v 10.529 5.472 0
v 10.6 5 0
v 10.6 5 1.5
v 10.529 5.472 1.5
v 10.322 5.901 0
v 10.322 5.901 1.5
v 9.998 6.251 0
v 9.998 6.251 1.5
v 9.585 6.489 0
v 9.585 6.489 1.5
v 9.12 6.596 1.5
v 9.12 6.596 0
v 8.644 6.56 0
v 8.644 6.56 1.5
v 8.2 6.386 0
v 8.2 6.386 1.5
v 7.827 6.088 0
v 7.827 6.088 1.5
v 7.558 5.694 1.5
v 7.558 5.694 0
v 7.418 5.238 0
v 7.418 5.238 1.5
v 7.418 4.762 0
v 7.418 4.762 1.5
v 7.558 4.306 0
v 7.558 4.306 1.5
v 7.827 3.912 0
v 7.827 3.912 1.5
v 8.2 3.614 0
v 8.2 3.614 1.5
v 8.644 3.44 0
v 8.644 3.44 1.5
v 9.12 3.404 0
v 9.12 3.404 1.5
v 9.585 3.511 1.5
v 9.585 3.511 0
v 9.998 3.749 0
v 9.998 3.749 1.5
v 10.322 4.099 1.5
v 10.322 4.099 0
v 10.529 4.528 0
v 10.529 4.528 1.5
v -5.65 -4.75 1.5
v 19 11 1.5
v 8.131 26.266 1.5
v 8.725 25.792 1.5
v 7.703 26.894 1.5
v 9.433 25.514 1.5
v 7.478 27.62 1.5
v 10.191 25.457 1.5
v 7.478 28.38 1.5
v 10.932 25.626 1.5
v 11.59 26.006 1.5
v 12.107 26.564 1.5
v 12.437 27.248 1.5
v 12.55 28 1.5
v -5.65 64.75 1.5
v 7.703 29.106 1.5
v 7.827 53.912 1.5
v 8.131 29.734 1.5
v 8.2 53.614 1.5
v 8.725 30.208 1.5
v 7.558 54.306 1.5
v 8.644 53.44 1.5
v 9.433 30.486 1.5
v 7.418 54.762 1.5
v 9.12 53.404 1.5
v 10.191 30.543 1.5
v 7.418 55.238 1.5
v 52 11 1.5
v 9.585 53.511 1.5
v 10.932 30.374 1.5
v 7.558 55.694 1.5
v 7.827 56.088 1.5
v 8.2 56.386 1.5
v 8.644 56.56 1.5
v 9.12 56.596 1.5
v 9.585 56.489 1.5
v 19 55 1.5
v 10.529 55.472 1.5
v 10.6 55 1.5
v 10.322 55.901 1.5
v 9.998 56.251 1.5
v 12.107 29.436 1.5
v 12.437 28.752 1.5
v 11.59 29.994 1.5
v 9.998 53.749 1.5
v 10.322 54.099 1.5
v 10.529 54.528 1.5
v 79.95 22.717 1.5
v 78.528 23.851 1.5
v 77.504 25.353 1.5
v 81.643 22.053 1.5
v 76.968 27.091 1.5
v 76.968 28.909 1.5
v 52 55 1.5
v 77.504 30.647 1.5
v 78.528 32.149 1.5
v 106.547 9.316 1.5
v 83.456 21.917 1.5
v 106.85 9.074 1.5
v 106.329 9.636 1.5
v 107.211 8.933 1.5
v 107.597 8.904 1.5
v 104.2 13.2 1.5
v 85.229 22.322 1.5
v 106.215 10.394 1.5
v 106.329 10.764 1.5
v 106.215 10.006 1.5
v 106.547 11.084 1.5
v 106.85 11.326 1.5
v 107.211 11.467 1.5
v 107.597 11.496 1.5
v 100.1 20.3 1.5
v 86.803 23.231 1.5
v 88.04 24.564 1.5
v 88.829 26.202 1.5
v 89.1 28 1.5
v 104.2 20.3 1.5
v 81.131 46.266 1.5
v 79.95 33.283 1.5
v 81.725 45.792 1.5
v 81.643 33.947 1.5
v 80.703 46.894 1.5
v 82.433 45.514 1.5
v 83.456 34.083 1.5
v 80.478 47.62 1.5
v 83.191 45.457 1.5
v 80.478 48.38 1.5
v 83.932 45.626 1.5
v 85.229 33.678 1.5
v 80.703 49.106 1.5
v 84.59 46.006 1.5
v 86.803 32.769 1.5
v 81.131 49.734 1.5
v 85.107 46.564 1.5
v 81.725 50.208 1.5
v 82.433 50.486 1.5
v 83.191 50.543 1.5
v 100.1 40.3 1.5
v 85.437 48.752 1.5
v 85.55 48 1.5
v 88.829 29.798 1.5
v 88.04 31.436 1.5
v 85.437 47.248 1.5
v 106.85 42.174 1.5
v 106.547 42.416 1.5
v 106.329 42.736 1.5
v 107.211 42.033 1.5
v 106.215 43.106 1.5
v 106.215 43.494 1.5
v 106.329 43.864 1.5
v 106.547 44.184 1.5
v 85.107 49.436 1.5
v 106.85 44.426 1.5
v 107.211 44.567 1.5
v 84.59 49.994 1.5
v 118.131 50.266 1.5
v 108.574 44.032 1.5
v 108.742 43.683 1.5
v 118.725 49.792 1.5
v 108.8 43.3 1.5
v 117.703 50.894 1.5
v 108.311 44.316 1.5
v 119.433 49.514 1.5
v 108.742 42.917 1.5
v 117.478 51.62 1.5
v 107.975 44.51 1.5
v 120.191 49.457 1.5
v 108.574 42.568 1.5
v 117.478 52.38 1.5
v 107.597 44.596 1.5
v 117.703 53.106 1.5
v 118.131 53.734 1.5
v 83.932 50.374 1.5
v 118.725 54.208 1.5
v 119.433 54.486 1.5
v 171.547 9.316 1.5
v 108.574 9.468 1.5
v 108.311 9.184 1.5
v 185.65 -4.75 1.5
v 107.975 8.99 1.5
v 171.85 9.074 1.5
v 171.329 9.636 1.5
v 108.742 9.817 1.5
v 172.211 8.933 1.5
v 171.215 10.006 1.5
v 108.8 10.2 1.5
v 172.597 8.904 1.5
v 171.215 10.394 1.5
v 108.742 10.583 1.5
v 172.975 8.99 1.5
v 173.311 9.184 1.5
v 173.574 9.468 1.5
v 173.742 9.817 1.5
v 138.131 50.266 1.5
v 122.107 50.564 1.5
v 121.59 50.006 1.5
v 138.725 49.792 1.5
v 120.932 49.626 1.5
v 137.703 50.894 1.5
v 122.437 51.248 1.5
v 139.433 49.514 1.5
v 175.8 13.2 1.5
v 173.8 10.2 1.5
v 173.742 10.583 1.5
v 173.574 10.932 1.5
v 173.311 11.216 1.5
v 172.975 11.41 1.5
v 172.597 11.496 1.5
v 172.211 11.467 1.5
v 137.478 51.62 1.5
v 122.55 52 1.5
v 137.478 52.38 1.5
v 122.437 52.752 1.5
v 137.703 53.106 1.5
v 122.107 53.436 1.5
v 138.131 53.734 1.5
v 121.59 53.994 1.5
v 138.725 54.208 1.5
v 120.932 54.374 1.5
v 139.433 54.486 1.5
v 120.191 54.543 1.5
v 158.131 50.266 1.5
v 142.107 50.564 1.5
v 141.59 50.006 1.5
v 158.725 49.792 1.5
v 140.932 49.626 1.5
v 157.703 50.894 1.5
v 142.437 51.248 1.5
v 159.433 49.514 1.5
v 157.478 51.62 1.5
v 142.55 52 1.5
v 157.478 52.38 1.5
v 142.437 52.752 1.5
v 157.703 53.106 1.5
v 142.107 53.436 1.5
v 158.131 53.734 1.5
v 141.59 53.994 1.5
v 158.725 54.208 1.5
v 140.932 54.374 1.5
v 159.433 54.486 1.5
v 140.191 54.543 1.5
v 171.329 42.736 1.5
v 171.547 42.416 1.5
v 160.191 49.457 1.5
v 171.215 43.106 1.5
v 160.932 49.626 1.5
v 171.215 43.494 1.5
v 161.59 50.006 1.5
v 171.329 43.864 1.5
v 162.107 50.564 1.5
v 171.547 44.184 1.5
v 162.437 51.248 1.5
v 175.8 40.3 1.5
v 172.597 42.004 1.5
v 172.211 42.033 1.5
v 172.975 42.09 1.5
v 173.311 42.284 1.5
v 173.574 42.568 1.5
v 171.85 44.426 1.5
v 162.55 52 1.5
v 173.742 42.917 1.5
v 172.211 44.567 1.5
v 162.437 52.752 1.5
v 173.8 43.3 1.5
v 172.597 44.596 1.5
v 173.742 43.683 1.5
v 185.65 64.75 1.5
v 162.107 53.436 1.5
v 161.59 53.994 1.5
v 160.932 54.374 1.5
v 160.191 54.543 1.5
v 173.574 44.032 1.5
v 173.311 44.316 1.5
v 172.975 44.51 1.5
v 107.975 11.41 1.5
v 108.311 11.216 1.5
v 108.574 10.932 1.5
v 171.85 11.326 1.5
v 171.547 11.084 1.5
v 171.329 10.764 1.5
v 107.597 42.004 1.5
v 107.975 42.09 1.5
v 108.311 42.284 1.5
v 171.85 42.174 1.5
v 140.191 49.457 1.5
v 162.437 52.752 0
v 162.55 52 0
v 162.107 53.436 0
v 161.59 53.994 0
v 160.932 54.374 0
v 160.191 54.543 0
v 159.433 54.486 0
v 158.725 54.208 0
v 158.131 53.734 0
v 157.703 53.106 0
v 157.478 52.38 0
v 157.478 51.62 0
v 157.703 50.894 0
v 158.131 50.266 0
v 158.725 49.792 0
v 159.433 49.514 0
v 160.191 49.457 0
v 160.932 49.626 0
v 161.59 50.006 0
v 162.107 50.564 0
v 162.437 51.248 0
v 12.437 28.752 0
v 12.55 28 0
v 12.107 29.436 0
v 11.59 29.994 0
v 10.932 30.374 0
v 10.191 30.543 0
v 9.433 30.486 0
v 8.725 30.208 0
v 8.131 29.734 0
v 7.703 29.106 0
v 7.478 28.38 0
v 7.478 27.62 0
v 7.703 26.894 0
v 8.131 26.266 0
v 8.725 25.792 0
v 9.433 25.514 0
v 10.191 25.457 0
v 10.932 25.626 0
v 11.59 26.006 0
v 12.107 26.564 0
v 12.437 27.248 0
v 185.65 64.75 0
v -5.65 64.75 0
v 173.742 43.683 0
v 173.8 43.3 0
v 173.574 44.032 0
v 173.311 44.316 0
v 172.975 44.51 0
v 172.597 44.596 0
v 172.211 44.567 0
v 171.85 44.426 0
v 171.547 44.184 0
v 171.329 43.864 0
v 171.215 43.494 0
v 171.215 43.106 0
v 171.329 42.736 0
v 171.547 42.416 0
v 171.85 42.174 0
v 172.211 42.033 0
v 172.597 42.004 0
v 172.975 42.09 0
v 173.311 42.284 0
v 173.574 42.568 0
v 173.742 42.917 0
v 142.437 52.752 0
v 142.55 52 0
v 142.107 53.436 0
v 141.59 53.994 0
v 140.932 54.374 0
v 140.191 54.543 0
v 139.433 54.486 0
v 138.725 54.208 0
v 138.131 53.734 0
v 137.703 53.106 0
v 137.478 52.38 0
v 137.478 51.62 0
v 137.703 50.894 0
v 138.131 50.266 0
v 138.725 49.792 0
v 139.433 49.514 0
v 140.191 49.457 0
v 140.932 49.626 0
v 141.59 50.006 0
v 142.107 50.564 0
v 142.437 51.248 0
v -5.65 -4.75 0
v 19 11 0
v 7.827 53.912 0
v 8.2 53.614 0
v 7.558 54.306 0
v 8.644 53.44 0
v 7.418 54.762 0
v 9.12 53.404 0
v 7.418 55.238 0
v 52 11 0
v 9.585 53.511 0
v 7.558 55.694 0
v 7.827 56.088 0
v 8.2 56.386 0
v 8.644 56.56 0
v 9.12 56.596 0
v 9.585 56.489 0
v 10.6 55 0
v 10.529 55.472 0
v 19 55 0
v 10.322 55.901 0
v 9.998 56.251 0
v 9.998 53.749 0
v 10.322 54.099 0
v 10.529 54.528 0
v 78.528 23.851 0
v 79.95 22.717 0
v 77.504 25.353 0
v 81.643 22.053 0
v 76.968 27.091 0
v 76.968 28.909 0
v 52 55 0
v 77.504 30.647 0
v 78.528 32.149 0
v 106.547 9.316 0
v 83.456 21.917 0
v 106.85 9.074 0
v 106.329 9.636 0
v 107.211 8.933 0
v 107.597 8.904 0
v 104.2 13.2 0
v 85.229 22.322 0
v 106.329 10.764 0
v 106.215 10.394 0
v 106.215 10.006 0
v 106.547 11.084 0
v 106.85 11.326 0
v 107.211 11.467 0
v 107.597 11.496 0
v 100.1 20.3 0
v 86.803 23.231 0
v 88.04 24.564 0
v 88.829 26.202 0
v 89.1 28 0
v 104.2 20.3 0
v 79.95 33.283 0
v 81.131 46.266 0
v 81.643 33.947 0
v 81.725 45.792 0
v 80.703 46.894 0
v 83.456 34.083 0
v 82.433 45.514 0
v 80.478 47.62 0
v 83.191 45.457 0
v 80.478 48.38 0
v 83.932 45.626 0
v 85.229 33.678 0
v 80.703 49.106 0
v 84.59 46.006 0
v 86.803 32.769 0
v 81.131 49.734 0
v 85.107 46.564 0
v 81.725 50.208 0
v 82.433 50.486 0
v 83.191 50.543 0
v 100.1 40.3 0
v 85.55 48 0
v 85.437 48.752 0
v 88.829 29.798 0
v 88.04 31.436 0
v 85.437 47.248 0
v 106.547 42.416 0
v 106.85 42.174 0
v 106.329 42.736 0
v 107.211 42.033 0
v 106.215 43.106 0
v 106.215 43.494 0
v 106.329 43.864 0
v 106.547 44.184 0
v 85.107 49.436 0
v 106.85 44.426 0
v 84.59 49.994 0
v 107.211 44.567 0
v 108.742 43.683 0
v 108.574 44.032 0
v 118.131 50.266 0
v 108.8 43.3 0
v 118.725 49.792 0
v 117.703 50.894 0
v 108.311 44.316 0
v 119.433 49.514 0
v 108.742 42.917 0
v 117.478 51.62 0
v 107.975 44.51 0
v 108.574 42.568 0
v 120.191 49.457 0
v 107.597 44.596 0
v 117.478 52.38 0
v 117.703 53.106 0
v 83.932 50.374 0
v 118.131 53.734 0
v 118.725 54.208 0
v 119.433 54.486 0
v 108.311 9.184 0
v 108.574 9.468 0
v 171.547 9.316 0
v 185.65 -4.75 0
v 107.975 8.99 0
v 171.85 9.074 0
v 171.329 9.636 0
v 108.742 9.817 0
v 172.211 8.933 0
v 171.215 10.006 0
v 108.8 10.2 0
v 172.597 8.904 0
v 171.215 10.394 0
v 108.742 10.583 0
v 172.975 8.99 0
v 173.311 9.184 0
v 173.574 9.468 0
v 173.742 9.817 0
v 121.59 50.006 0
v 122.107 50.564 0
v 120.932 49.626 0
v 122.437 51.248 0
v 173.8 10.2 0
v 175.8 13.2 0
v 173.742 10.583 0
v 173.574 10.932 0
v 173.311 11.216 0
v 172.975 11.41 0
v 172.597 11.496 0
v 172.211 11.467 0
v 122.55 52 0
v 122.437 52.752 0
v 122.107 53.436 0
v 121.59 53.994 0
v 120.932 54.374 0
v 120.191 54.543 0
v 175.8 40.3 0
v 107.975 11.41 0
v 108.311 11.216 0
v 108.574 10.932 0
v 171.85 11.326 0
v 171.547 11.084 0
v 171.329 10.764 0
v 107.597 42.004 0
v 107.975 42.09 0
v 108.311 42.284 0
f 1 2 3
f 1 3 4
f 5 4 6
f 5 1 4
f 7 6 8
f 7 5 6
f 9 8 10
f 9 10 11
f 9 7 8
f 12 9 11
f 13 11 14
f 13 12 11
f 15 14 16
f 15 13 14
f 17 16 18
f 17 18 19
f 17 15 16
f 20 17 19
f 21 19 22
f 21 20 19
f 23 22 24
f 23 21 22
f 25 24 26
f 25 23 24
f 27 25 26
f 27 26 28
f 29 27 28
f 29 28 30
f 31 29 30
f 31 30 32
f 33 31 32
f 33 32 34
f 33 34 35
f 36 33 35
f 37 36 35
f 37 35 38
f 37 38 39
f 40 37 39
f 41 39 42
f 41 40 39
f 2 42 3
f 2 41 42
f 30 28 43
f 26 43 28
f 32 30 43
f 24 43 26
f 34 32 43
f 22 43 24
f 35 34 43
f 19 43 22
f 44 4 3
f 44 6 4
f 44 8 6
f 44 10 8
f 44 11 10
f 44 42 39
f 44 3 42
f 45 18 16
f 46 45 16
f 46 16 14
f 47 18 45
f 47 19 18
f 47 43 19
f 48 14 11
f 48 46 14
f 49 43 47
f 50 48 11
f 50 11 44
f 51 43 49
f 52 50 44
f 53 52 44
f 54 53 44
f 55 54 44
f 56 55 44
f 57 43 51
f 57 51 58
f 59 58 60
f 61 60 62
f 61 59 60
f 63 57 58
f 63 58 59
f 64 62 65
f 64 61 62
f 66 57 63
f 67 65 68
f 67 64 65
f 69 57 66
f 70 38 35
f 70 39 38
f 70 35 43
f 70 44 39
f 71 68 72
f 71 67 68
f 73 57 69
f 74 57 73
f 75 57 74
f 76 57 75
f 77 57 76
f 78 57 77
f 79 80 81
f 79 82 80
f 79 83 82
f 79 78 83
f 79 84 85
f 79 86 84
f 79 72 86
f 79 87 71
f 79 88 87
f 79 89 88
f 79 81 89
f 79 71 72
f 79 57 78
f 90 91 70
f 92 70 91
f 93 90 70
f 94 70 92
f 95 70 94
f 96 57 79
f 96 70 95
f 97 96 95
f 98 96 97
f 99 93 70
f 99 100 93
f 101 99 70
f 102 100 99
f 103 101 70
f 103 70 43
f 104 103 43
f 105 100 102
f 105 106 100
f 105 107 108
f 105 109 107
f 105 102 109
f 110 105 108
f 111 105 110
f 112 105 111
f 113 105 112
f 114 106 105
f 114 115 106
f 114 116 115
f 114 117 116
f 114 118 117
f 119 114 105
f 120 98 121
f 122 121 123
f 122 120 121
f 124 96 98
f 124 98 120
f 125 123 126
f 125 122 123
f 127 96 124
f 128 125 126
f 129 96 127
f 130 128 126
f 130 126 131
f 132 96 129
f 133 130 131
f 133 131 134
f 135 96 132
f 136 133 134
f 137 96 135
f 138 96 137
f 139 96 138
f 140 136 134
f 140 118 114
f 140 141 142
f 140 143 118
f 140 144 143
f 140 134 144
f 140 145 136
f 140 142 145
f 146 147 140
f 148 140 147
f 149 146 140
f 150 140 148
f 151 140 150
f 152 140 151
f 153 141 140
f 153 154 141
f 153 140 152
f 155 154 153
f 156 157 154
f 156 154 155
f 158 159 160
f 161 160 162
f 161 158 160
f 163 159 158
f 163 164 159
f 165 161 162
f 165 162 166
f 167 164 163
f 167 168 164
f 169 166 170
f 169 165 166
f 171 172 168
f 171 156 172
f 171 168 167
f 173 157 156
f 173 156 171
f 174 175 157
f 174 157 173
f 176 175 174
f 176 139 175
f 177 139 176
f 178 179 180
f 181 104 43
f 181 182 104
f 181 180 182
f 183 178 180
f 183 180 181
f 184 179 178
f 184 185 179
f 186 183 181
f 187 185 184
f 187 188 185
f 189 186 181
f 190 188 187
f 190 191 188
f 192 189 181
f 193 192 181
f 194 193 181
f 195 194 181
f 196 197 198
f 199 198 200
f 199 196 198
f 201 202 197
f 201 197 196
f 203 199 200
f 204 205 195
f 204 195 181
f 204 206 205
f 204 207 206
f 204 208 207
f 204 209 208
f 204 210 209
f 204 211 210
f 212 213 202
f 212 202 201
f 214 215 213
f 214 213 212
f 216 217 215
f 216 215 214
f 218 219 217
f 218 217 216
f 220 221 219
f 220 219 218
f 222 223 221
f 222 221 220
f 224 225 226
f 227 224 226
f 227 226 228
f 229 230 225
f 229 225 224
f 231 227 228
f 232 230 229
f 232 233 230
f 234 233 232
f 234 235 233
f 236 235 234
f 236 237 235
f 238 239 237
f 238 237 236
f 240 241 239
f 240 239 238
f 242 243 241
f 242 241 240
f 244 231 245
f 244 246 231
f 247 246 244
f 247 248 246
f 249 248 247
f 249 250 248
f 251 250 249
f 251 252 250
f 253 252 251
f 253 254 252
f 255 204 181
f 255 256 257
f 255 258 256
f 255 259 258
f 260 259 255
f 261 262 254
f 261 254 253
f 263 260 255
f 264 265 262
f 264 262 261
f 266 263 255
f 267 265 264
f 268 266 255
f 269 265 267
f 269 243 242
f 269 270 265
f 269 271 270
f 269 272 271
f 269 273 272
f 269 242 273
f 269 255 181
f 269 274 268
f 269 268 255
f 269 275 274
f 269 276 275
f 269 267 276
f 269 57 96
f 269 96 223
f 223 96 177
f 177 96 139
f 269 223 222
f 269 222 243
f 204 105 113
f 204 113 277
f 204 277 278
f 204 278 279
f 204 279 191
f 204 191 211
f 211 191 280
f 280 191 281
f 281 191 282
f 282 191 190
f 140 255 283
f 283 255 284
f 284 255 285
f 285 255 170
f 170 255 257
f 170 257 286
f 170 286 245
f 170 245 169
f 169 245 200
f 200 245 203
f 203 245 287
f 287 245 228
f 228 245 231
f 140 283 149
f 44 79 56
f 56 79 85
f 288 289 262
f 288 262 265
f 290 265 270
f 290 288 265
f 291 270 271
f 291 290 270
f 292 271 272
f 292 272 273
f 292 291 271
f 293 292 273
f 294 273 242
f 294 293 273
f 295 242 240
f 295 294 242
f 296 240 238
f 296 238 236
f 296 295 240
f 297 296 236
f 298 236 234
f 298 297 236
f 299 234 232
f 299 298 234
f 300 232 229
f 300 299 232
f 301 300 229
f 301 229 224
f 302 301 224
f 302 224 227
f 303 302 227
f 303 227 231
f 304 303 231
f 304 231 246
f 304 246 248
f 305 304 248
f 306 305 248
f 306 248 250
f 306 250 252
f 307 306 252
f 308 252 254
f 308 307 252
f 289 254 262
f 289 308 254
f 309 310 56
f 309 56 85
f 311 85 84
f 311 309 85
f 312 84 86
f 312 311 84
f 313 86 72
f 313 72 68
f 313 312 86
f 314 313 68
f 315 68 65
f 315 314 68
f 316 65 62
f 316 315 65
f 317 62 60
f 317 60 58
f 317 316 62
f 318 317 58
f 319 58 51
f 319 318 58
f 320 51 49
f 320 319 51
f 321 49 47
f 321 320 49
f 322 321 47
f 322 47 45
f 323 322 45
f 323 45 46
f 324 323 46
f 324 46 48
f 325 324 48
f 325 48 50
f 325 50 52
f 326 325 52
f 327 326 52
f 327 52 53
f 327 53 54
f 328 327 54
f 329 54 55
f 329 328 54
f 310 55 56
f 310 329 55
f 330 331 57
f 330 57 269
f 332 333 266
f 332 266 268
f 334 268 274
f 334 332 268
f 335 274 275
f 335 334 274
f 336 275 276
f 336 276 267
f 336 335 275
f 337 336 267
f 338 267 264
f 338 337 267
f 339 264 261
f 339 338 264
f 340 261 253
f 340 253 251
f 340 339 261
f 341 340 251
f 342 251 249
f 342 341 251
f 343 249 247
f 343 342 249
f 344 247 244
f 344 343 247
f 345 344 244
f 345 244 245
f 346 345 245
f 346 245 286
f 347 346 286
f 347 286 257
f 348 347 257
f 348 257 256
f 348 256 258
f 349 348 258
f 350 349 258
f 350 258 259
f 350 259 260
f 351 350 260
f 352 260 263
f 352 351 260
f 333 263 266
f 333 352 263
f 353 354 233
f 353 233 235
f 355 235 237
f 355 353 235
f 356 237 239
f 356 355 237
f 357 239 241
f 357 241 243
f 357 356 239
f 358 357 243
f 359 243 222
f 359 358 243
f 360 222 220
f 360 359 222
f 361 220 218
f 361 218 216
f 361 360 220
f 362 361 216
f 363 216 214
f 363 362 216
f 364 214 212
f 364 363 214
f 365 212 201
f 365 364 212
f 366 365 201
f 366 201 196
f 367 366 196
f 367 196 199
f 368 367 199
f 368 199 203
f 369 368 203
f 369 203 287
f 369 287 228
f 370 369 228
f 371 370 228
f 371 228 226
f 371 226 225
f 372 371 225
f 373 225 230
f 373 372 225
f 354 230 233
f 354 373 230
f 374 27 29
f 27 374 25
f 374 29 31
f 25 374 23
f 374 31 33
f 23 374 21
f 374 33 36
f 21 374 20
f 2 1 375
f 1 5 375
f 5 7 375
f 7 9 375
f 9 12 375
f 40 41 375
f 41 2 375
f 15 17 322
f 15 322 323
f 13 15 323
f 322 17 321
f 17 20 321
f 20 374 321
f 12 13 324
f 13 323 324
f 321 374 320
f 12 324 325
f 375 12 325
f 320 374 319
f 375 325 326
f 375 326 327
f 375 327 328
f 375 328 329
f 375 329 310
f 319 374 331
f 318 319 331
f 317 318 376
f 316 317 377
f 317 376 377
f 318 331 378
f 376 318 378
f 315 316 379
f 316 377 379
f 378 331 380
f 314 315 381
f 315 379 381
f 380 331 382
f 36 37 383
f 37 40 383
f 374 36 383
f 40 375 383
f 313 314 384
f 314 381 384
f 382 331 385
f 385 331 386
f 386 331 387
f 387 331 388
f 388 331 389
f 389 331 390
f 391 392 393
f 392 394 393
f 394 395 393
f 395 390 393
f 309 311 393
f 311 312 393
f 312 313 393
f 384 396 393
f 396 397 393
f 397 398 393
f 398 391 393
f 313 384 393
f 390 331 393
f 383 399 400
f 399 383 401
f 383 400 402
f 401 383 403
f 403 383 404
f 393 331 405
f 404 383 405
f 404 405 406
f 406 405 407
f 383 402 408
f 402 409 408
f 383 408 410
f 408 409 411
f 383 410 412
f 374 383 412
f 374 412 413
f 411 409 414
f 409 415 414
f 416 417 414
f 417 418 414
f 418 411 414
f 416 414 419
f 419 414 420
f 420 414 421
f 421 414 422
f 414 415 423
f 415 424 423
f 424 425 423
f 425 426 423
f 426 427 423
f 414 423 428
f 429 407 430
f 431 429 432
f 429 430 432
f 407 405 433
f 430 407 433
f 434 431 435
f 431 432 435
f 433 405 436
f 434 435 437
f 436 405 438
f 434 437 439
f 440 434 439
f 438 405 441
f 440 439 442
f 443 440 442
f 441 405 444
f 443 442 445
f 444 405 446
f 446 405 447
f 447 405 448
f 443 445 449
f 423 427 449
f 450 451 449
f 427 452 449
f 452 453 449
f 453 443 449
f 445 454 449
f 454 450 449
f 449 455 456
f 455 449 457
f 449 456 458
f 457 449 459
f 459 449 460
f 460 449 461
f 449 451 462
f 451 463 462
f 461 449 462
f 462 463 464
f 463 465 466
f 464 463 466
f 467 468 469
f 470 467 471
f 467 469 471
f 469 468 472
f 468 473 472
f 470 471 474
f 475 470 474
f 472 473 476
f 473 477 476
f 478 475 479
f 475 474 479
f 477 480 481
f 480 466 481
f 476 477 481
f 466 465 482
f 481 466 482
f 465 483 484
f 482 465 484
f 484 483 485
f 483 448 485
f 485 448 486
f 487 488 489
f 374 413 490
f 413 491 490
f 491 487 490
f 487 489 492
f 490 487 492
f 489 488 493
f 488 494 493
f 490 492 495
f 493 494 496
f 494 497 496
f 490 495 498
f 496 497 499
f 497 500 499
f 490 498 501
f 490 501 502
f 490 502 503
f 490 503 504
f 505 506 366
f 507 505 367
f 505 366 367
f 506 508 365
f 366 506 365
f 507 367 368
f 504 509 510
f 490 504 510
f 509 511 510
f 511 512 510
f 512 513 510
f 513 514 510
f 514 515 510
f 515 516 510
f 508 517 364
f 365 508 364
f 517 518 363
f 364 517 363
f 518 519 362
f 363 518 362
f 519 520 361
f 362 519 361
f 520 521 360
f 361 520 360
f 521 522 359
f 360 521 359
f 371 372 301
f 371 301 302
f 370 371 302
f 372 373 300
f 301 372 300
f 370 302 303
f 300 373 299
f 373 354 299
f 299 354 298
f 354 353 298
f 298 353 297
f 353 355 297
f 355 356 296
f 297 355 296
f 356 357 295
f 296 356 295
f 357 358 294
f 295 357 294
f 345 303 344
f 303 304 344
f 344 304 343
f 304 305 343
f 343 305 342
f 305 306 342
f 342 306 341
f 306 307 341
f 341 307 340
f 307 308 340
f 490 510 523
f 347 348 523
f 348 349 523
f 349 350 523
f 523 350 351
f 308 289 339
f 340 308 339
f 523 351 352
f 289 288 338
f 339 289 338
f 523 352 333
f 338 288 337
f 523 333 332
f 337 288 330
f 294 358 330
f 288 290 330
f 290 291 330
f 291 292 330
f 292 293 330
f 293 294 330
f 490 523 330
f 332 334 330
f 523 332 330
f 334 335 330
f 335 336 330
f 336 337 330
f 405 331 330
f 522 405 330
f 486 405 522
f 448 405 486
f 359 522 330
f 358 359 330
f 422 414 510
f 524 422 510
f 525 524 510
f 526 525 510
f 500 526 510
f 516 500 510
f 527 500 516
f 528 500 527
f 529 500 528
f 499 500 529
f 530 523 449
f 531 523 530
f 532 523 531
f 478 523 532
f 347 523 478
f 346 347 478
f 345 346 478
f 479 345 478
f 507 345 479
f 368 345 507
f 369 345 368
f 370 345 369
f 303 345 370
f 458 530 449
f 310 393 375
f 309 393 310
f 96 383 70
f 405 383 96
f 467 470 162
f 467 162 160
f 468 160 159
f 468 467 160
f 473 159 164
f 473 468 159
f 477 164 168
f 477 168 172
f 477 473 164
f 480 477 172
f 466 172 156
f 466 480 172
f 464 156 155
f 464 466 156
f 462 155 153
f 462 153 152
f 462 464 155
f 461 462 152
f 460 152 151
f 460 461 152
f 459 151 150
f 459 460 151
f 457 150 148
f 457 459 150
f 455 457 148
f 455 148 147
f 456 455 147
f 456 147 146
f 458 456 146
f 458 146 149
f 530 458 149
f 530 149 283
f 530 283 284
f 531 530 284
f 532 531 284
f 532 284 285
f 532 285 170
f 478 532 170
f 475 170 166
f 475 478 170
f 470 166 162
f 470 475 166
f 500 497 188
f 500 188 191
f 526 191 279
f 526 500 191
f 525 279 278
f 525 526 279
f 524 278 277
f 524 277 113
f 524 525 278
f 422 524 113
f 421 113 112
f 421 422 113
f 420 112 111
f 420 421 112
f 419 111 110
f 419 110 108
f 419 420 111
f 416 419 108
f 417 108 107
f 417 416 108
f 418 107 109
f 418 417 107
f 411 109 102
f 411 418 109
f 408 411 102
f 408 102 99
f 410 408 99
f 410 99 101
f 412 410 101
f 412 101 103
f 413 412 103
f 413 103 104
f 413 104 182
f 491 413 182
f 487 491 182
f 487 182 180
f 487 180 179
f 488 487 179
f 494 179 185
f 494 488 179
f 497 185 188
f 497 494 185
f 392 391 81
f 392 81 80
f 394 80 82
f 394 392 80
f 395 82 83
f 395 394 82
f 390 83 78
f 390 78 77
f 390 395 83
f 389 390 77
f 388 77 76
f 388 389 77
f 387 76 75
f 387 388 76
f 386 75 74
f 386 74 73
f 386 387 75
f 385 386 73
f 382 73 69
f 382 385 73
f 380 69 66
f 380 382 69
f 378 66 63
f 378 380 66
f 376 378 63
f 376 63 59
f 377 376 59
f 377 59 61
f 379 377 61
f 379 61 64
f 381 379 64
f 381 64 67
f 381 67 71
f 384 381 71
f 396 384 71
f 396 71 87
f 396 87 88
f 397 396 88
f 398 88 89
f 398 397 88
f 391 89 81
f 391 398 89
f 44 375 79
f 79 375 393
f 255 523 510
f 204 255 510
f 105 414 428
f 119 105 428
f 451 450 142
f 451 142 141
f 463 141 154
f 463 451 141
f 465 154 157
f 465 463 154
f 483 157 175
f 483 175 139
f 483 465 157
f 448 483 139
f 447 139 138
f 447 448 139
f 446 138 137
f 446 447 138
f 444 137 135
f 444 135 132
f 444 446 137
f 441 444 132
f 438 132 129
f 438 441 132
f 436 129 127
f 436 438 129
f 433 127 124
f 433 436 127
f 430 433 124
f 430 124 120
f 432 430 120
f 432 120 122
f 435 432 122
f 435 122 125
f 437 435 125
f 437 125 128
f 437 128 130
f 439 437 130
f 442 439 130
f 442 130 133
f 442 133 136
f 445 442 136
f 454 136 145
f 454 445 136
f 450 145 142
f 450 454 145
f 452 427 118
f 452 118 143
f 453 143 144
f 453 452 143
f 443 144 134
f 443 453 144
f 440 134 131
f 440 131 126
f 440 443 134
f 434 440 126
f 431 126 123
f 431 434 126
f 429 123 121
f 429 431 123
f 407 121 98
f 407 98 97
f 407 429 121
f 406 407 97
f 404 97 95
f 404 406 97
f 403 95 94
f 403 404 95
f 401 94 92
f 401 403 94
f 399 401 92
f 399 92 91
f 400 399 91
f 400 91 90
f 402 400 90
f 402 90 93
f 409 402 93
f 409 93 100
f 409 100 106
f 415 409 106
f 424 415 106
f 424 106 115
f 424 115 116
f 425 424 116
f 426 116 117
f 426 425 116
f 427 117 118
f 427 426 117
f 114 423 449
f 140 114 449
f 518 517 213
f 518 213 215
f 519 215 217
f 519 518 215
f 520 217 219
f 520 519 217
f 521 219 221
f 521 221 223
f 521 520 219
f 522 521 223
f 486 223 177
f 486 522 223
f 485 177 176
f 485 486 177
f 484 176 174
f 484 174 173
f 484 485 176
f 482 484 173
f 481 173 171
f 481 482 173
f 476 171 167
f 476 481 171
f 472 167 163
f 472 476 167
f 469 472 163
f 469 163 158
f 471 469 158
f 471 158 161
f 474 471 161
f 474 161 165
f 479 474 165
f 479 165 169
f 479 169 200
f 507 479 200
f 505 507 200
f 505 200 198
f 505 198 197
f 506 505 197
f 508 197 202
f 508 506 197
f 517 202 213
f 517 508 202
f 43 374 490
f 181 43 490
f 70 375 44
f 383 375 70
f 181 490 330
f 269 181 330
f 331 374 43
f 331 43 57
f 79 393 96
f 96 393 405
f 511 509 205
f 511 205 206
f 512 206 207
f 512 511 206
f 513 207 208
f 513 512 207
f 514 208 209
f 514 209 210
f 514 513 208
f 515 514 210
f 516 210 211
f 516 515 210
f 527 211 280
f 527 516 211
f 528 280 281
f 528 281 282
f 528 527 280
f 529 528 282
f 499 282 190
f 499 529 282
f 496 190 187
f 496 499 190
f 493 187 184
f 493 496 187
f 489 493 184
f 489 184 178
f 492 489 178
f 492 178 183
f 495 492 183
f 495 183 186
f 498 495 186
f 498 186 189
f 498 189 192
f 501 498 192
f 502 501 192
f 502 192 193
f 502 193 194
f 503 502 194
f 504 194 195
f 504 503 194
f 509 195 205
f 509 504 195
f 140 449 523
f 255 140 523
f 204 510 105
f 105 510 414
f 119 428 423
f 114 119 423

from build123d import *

# Parameters (mm, degrees)
F0_W     = 191.3
F0_H     = 69.5
F0_R     = 1.6
F0_R_2   = 2.55
F0_R_3   = 6.1
F0_R_4   = 1.3
F0_W_2   = 33
F0_H_2   = 44
F1_DEPTH = 1.5


with BuildPart() as f1:
    # F0 (on Top) → F1 (new body)
    with BuildSketch(Plane.XY):
        with Locations((90, 30)):
            Rectangle(F0_W, F0_H)
        with Locations((9, 5)):
            Circle(F0_R, mode=Mode.SUBTRACT)
        with Locations((10, 28)):
            Circle(F0_R_2, mode=Mode.SUBTRACT)
        with Locations((83, 28)):
            Circle(F0_R_3, mode=Mode.SUBTRACT)
        with Locations((107.5, 10.2)):
            Circle(F0_R_4, mode=Mode.SUBTRACT)
        with Locations((172.5, 10.2)):
            Circle(F0_R_4, mode=Mode.SUBTRACT)
        Polygon((175.8, 13.2), (104.2, 13.2), (104.2, 20.3), (100.1, 20.3), (100.1, 40.3), (104.2, 40.3), (175.8, 40.3), align=None, mode=Mode.SUBTRACT)
        with Locations((35.5, 33)):
            Rectangle(F0_W_2, F0_H_2, mode=Mode.SUBTRACT)
        with Locations((9, 55)):
            Circle(F0_R, mode=Mode.SUBTRACT)
        with Locations((83, 48)):
            Circle(F0_R_2, mode=Mode.SUBTRACT)
        with Locations((107.5, 43.3)):
            Circle(F0_R_4, mode=Mode.SUBTRACT)
        with Locations((172.5, 43.3)):
            Circle(F0_R_4, mode=Mode.SUBTRACT)
        with Locations((120, 52)):
            Circle(F0_R_2, mode=Mode.SUBTRACT)
        with Locations((140, 52)):
            Circle(F0_R_2, mode=Mode.SUBTRACT)
        with Locations((160, 52)):
            Circle(F0_R_2, mode=Mode.SUBTRACT)
    extrude(amount=F1_DEPTH)


solid = f1.part
